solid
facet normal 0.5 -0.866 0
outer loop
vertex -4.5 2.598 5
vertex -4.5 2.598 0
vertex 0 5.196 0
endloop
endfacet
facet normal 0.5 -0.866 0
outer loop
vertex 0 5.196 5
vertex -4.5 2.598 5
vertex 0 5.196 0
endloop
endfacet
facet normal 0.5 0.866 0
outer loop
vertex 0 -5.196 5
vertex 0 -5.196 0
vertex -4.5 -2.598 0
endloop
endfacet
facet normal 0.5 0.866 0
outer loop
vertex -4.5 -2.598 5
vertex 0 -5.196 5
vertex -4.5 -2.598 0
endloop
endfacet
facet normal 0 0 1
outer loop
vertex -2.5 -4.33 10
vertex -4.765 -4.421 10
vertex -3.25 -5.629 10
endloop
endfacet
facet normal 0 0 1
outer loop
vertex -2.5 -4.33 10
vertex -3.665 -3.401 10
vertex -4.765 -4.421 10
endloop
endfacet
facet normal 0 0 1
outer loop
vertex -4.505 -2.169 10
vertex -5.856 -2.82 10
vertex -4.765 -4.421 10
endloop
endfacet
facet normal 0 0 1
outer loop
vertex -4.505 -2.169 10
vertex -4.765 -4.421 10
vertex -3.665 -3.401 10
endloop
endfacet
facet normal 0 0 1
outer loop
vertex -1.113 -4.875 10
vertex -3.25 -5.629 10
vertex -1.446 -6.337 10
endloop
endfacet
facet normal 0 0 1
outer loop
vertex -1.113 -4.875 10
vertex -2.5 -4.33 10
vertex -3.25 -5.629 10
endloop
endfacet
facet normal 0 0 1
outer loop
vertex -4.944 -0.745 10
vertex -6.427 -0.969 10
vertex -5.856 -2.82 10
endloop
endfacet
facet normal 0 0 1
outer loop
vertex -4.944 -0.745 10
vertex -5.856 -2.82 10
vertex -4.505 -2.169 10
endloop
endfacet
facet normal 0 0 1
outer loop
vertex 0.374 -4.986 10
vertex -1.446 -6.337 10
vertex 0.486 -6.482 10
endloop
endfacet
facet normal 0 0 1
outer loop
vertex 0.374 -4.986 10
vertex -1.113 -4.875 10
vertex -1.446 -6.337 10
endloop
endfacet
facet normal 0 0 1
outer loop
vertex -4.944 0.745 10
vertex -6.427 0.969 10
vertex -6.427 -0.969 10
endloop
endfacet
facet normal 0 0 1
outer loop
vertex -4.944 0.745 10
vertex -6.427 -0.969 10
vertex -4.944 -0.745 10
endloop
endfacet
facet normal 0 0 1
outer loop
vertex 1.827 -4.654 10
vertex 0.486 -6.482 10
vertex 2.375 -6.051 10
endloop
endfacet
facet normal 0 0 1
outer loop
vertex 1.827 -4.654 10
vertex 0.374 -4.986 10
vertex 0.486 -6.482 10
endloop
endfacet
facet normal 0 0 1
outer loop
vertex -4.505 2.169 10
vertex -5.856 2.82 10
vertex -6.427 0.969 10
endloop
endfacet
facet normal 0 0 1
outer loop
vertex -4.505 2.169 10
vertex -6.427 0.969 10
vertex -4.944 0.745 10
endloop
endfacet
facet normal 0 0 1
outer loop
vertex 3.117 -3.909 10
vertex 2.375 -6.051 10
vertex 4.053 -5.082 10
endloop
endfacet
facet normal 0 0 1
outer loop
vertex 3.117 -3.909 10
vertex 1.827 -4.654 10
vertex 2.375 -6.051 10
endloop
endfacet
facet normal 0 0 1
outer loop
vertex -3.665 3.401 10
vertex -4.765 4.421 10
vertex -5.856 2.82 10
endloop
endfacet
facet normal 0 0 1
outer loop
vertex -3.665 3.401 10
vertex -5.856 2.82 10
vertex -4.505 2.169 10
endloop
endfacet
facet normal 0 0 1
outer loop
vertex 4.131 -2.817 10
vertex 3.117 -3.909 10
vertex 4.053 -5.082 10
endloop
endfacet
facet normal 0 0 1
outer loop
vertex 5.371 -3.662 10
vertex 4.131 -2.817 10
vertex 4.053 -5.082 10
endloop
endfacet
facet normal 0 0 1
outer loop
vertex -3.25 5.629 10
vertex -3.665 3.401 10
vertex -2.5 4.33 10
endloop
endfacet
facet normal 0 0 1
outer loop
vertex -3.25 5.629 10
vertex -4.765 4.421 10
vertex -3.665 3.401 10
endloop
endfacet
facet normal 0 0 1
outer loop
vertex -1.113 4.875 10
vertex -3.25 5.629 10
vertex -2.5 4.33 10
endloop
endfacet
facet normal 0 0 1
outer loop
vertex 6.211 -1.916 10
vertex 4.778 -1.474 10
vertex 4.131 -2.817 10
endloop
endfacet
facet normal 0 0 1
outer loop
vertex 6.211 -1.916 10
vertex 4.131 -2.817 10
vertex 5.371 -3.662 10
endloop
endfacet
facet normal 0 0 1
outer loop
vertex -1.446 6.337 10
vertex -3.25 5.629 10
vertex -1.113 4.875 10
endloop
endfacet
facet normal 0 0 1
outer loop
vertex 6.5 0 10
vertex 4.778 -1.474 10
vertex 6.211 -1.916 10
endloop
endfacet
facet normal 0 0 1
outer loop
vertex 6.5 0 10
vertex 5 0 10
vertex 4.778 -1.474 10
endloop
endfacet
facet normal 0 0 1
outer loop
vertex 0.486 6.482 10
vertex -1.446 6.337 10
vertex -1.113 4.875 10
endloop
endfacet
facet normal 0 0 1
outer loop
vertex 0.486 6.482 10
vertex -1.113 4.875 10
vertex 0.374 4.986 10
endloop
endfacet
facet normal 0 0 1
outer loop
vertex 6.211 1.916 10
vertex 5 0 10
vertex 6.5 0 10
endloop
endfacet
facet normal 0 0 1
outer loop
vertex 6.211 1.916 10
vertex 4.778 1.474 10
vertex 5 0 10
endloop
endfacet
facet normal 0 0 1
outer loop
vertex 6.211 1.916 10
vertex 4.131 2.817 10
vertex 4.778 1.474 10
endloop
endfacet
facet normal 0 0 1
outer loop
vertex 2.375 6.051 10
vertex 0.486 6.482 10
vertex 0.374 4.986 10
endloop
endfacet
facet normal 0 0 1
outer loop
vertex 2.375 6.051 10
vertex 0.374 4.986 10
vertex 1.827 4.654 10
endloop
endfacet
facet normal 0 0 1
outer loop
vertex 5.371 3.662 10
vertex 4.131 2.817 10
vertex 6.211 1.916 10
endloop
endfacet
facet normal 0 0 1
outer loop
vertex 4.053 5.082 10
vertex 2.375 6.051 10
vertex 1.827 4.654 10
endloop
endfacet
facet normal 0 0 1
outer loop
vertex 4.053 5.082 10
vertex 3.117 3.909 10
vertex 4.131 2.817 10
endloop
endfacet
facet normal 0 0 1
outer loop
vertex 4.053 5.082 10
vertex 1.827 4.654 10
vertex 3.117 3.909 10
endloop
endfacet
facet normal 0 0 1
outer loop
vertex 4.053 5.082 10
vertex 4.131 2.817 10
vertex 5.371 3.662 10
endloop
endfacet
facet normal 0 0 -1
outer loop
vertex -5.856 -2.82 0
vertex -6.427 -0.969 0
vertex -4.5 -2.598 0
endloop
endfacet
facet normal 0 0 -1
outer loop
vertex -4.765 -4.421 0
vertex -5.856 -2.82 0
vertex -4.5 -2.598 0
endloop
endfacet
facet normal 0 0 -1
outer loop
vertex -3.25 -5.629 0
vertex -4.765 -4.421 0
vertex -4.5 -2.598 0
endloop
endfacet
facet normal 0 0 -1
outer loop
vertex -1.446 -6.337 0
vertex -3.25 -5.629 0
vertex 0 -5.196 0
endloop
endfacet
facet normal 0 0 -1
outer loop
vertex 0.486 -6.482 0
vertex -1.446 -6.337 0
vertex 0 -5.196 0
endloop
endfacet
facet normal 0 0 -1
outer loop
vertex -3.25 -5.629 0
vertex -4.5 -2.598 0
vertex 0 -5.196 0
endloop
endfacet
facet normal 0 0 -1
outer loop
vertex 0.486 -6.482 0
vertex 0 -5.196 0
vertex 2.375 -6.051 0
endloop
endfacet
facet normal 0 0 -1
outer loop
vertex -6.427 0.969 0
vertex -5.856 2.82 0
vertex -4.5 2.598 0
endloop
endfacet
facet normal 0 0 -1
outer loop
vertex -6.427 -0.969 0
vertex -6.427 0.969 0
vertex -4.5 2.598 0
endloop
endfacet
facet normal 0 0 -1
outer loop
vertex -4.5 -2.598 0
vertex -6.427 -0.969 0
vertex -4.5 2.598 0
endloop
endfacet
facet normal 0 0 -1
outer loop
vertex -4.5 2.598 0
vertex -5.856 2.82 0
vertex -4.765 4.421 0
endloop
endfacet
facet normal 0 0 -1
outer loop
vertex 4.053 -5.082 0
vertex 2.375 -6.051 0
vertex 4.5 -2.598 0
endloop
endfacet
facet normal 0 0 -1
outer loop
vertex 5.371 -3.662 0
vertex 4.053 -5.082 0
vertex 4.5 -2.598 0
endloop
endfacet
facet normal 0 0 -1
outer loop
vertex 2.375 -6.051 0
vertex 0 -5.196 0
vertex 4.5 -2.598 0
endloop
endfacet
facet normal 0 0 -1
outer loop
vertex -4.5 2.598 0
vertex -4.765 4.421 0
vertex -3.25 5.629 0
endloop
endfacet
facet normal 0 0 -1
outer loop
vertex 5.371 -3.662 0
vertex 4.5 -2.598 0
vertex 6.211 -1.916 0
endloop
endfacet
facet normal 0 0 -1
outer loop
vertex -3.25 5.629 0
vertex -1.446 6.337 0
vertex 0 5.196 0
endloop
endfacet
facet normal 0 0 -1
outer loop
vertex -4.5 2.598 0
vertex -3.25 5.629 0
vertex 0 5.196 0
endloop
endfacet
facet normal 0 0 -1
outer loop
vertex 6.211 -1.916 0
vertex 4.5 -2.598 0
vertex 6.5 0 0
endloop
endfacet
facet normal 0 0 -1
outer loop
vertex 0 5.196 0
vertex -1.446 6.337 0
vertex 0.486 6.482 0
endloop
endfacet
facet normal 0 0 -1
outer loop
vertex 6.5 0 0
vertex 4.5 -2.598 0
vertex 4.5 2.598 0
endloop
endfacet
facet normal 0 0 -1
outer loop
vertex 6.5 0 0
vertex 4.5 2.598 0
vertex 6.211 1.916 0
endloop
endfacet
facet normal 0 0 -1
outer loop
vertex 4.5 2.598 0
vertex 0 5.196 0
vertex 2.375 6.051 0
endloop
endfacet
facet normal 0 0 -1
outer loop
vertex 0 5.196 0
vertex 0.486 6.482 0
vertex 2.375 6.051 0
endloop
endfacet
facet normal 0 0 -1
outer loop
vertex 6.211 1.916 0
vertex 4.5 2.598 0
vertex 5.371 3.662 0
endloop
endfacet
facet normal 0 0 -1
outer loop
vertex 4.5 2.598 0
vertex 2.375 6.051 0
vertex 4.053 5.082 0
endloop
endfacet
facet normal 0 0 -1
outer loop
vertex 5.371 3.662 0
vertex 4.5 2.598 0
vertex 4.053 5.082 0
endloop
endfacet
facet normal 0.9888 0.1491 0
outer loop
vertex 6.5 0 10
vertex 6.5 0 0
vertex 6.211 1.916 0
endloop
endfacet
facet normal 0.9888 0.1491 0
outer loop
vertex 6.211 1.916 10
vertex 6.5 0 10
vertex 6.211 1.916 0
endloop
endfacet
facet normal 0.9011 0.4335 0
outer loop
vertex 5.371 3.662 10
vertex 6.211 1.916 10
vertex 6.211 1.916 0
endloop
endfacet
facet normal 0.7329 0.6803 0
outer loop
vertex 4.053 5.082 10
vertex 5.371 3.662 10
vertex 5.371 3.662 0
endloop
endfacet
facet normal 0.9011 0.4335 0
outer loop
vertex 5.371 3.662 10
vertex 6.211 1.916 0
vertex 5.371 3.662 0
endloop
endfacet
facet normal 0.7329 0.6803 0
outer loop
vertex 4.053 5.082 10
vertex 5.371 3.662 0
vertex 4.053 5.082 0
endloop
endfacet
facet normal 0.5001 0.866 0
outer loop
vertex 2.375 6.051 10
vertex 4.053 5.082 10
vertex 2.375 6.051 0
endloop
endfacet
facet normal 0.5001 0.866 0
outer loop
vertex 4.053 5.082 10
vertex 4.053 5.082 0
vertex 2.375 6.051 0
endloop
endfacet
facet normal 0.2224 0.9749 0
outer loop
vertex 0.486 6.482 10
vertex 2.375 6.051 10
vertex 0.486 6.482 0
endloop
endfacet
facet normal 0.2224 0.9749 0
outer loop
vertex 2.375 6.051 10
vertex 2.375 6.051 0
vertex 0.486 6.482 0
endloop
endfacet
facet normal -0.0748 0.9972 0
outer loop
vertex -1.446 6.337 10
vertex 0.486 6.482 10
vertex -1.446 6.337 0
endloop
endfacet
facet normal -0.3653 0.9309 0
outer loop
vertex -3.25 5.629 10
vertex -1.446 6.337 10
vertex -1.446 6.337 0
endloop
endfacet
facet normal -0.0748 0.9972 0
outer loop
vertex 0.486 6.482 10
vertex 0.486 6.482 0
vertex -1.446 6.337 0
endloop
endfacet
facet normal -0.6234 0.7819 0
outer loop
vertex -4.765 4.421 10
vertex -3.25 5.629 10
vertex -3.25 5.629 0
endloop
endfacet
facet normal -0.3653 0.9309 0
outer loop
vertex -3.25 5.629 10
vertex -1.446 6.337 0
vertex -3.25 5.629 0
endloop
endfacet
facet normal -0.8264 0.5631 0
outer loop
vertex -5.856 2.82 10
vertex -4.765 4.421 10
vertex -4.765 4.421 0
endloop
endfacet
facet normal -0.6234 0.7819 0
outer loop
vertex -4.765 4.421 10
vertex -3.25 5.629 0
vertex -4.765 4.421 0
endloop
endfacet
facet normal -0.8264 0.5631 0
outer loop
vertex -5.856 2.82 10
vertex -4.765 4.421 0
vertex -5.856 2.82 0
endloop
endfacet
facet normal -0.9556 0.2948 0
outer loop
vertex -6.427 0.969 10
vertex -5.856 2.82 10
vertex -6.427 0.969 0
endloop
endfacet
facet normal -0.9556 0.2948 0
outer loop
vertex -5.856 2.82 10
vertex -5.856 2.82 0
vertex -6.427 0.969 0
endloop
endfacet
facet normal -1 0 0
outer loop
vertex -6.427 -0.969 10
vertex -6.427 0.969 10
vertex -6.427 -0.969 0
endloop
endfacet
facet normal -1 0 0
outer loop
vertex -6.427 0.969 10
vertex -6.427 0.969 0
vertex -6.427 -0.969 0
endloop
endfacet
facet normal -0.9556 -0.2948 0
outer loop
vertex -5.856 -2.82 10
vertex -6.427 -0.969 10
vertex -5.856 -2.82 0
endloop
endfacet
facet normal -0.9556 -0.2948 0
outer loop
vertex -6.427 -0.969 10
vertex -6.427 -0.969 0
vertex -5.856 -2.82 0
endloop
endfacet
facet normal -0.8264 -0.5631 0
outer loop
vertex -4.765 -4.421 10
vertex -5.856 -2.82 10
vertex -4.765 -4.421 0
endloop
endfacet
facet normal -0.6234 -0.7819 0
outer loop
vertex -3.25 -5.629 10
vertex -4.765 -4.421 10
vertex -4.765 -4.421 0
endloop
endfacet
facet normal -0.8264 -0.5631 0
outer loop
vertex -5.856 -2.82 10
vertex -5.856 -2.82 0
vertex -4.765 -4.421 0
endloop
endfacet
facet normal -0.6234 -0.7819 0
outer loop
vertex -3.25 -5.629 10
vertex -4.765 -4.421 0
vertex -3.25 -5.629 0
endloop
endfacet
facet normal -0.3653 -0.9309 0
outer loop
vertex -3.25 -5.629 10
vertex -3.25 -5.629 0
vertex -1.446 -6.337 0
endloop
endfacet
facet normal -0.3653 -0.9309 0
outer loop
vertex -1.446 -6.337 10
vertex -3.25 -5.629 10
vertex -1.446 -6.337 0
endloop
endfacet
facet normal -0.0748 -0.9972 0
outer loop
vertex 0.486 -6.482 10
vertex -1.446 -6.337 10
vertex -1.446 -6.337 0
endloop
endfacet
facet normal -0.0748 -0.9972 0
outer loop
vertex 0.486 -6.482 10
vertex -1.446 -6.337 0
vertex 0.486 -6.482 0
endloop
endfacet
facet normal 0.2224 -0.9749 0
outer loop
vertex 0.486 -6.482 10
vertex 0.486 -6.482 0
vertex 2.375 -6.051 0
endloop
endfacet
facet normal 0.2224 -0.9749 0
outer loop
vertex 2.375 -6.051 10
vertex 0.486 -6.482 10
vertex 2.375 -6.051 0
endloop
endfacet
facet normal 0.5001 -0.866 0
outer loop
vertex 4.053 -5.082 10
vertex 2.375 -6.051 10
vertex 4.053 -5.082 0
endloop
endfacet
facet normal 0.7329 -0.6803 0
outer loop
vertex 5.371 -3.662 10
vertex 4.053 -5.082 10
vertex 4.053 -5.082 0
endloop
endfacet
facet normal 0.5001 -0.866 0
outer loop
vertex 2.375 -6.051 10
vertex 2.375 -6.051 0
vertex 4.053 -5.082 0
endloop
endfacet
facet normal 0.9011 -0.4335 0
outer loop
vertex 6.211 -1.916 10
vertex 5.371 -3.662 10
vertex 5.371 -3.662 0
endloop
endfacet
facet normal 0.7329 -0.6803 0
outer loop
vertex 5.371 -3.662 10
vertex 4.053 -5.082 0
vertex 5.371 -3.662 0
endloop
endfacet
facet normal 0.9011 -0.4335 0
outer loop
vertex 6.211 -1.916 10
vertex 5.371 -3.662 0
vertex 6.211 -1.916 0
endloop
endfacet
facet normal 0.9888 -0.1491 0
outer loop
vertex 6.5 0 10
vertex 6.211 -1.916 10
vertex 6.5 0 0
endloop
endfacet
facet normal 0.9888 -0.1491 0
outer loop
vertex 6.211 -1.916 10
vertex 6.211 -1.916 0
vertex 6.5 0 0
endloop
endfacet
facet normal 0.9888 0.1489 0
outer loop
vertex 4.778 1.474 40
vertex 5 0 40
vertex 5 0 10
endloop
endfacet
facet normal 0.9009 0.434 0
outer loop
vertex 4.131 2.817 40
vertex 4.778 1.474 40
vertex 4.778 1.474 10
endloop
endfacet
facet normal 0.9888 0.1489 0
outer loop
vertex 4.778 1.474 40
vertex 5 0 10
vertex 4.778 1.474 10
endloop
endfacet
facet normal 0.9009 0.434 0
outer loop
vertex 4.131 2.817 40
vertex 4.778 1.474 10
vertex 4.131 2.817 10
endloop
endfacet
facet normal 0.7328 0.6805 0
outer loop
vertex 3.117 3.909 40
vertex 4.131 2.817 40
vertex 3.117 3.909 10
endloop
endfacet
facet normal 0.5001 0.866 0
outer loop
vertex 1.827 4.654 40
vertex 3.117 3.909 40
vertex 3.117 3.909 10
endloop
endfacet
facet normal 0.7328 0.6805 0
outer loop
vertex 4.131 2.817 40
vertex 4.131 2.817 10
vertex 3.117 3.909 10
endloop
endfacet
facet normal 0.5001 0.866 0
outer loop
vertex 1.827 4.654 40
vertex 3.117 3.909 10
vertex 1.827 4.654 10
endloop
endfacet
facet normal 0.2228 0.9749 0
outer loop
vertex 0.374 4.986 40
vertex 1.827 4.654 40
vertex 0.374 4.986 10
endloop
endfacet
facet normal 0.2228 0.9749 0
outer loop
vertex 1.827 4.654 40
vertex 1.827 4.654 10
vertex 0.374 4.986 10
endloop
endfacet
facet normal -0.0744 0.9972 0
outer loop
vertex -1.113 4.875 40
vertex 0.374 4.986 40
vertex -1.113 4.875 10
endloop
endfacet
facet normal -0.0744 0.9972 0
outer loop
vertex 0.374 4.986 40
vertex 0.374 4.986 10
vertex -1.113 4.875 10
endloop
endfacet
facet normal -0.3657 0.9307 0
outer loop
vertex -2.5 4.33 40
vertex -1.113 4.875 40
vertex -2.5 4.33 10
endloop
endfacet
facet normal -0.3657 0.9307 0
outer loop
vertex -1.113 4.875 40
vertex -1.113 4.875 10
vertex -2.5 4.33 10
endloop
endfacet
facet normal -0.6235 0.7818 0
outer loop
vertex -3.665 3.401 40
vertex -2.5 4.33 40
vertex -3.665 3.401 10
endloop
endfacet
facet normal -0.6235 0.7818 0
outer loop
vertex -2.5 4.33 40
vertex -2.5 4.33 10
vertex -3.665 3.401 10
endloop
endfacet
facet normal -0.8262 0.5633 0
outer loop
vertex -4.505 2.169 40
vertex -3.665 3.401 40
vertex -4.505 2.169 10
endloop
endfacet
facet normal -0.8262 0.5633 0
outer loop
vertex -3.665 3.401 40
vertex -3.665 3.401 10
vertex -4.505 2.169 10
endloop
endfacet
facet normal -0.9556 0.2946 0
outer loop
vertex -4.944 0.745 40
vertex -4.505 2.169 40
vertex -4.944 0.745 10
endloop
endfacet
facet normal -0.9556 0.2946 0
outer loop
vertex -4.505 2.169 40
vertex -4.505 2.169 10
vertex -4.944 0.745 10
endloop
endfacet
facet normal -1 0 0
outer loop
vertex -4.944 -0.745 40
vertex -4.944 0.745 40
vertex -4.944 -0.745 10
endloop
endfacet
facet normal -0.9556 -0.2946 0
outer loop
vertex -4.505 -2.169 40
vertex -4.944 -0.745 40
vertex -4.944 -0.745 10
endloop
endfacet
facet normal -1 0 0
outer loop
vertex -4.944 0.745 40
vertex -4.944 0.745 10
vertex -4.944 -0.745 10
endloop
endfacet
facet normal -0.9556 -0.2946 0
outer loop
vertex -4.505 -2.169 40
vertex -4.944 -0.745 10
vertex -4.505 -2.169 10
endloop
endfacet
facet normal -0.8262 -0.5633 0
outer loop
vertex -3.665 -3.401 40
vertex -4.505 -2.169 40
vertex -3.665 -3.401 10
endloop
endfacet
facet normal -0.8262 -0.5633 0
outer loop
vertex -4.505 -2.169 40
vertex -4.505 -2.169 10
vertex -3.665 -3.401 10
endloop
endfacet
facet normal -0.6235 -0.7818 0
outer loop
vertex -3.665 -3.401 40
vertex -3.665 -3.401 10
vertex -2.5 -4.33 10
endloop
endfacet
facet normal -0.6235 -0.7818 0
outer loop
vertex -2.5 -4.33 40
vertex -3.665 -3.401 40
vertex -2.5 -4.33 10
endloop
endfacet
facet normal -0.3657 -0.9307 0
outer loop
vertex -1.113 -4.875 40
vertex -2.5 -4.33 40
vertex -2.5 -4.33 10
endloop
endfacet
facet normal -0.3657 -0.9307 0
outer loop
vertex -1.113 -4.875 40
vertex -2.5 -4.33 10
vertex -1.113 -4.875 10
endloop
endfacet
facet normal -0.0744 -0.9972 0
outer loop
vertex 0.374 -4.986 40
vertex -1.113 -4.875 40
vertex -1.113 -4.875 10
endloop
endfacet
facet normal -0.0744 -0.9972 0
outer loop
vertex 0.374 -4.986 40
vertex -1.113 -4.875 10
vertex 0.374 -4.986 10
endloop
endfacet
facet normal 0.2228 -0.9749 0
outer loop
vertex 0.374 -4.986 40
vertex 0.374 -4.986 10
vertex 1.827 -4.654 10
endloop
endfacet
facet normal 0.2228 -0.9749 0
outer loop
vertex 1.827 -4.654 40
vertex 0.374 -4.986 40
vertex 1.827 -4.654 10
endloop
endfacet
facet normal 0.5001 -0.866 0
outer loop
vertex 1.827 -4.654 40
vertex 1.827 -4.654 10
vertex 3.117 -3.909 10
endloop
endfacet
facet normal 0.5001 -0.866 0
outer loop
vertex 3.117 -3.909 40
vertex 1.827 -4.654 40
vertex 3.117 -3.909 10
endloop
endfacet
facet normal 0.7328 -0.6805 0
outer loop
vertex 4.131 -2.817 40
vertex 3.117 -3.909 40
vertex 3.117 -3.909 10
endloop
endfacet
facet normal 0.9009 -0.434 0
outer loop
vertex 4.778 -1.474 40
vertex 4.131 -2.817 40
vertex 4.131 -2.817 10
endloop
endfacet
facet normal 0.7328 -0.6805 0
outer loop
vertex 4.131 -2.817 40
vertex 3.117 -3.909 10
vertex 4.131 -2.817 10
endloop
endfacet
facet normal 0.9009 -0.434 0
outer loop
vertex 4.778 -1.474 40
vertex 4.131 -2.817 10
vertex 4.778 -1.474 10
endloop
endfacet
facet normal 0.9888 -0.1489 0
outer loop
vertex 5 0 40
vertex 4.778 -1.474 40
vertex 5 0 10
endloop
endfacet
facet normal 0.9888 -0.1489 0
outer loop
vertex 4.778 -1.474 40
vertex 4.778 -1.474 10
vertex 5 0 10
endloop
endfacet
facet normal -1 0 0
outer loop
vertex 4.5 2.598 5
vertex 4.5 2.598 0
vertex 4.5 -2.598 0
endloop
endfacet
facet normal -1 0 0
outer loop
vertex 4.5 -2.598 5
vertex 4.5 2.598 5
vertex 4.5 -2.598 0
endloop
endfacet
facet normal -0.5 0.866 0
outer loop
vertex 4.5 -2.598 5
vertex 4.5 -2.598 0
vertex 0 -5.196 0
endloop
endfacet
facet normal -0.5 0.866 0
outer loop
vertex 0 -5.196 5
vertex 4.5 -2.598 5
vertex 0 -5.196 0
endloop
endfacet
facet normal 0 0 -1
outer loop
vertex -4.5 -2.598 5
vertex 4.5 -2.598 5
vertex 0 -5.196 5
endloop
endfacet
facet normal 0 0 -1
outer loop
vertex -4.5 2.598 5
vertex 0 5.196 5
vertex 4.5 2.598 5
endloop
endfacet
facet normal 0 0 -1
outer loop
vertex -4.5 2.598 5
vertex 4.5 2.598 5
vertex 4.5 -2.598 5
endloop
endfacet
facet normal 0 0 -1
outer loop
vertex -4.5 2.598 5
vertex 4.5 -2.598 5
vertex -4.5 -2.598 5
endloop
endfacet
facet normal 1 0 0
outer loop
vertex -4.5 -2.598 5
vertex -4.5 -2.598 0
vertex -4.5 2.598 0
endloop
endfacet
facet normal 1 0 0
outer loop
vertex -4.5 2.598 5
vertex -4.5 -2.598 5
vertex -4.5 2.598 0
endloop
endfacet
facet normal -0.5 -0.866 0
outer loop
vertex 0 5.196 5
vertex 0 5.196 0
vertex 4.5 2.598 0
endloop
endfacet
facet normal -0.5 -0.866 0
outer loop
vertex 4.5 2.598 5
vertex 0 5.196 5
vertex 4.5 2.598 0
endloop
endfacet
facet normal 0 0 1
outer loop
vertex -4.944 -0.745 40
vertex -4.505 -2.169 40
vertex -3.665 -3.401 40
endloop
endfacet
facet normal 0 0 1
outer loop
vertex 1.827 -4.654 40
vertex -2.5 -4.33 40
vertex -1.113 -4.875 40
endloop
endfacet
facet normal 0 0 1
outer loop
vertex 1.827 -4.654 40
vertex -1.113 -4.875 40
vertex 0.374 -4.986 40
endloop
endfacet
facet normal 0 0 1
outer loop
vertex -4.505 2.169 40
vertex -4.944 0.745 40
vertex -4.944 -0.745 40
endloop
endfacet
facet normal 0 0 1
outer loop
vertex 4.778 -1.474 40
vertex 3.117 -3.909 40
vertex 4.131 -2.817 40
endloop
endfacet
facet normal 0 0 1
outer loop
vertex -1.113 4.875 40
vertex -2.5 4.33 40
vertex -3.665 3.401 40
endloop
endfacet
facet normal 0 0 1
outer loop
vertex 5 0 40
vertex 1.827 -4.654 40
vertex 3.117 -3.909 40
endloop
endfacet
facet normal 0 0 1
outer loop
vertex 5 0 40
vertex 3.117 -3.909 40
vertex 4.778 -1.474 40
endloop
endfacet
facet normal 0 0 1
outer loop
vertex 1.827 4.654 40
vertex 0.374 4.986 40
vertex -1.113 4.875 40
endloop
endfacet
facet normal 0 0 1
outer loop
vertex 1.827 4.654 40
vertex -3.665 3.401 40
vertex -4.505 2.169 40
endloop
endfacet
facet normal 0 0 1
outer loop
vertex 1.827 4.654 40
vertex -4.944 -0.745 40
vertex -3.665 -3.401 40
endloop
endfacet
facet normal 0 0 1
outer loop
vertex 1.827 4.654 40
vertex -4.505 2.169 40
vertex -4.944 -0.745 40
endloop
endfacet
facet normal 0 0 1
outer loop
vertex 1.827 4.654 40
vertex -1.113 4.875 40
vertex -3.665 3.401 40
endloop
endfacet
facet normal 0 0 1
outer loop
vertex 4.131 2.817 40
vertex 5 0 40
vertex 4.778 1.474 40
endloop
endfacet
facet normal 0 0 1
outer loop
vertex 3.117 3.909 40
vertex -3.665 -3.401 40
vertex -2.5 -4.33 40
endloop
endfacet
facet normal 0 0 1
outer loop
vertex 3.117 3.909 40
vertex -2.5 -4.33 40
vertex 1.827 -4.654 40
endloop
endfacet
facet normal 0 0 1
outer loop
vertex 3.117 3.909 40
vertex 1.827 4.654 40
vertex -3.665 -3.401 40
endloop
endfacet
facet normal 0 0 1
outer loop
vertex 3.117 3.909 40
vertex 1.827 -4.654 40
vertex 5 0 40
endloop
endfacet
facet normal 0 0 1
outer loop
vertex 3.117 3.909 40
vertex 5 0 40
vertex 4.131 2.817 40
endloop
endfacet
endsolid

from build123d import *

# Parameters (mm, degrees)
SKETCH1_R           = 6.5
BOSS_EXTRUDE1_DEPTH = 10
SKETCH2_R           = 5
BOSS_EXTRUDE2_DEPTH = 30
CUT_EXTRUDE1_DEPTH  = 5


with BuildPart() as part:
    # Sketch1 → Boss-Extrude1 (new body)
    with BuildSketch(Plane.XY):
        Circle(SKETCH1_R)
    extrude(amount=BOSS_EXTRUDE1_DEPTH)

    # Sketch2 → Boss-Extrude2 (add)
    with BuildSketch(Plane.XY.offset(10)):
        Circle(SKETCH2_R)
    extrude(amount=BOSS_EXTRUDE2_DEPTH)

    # Sketch3 → Cut-Extrude1 (cut)
    with BuildSketch(Plane(origin=(0, 0, 0), x_dir=(-1, 0, 0), z_dir=(0, 0, -1))):
        Polygon((4.5, 2.598076211), (0, 5.196152423), (-4.5, 2.598076211), (-4.5, -2.598076211), (0, -5.196152423), (4.5, -2.598076211), align=None)
    extrude(amount=-CUT_EXTRUDE1_DEPTH, mode=Mode.SUBTRACT)


solid = part.part
